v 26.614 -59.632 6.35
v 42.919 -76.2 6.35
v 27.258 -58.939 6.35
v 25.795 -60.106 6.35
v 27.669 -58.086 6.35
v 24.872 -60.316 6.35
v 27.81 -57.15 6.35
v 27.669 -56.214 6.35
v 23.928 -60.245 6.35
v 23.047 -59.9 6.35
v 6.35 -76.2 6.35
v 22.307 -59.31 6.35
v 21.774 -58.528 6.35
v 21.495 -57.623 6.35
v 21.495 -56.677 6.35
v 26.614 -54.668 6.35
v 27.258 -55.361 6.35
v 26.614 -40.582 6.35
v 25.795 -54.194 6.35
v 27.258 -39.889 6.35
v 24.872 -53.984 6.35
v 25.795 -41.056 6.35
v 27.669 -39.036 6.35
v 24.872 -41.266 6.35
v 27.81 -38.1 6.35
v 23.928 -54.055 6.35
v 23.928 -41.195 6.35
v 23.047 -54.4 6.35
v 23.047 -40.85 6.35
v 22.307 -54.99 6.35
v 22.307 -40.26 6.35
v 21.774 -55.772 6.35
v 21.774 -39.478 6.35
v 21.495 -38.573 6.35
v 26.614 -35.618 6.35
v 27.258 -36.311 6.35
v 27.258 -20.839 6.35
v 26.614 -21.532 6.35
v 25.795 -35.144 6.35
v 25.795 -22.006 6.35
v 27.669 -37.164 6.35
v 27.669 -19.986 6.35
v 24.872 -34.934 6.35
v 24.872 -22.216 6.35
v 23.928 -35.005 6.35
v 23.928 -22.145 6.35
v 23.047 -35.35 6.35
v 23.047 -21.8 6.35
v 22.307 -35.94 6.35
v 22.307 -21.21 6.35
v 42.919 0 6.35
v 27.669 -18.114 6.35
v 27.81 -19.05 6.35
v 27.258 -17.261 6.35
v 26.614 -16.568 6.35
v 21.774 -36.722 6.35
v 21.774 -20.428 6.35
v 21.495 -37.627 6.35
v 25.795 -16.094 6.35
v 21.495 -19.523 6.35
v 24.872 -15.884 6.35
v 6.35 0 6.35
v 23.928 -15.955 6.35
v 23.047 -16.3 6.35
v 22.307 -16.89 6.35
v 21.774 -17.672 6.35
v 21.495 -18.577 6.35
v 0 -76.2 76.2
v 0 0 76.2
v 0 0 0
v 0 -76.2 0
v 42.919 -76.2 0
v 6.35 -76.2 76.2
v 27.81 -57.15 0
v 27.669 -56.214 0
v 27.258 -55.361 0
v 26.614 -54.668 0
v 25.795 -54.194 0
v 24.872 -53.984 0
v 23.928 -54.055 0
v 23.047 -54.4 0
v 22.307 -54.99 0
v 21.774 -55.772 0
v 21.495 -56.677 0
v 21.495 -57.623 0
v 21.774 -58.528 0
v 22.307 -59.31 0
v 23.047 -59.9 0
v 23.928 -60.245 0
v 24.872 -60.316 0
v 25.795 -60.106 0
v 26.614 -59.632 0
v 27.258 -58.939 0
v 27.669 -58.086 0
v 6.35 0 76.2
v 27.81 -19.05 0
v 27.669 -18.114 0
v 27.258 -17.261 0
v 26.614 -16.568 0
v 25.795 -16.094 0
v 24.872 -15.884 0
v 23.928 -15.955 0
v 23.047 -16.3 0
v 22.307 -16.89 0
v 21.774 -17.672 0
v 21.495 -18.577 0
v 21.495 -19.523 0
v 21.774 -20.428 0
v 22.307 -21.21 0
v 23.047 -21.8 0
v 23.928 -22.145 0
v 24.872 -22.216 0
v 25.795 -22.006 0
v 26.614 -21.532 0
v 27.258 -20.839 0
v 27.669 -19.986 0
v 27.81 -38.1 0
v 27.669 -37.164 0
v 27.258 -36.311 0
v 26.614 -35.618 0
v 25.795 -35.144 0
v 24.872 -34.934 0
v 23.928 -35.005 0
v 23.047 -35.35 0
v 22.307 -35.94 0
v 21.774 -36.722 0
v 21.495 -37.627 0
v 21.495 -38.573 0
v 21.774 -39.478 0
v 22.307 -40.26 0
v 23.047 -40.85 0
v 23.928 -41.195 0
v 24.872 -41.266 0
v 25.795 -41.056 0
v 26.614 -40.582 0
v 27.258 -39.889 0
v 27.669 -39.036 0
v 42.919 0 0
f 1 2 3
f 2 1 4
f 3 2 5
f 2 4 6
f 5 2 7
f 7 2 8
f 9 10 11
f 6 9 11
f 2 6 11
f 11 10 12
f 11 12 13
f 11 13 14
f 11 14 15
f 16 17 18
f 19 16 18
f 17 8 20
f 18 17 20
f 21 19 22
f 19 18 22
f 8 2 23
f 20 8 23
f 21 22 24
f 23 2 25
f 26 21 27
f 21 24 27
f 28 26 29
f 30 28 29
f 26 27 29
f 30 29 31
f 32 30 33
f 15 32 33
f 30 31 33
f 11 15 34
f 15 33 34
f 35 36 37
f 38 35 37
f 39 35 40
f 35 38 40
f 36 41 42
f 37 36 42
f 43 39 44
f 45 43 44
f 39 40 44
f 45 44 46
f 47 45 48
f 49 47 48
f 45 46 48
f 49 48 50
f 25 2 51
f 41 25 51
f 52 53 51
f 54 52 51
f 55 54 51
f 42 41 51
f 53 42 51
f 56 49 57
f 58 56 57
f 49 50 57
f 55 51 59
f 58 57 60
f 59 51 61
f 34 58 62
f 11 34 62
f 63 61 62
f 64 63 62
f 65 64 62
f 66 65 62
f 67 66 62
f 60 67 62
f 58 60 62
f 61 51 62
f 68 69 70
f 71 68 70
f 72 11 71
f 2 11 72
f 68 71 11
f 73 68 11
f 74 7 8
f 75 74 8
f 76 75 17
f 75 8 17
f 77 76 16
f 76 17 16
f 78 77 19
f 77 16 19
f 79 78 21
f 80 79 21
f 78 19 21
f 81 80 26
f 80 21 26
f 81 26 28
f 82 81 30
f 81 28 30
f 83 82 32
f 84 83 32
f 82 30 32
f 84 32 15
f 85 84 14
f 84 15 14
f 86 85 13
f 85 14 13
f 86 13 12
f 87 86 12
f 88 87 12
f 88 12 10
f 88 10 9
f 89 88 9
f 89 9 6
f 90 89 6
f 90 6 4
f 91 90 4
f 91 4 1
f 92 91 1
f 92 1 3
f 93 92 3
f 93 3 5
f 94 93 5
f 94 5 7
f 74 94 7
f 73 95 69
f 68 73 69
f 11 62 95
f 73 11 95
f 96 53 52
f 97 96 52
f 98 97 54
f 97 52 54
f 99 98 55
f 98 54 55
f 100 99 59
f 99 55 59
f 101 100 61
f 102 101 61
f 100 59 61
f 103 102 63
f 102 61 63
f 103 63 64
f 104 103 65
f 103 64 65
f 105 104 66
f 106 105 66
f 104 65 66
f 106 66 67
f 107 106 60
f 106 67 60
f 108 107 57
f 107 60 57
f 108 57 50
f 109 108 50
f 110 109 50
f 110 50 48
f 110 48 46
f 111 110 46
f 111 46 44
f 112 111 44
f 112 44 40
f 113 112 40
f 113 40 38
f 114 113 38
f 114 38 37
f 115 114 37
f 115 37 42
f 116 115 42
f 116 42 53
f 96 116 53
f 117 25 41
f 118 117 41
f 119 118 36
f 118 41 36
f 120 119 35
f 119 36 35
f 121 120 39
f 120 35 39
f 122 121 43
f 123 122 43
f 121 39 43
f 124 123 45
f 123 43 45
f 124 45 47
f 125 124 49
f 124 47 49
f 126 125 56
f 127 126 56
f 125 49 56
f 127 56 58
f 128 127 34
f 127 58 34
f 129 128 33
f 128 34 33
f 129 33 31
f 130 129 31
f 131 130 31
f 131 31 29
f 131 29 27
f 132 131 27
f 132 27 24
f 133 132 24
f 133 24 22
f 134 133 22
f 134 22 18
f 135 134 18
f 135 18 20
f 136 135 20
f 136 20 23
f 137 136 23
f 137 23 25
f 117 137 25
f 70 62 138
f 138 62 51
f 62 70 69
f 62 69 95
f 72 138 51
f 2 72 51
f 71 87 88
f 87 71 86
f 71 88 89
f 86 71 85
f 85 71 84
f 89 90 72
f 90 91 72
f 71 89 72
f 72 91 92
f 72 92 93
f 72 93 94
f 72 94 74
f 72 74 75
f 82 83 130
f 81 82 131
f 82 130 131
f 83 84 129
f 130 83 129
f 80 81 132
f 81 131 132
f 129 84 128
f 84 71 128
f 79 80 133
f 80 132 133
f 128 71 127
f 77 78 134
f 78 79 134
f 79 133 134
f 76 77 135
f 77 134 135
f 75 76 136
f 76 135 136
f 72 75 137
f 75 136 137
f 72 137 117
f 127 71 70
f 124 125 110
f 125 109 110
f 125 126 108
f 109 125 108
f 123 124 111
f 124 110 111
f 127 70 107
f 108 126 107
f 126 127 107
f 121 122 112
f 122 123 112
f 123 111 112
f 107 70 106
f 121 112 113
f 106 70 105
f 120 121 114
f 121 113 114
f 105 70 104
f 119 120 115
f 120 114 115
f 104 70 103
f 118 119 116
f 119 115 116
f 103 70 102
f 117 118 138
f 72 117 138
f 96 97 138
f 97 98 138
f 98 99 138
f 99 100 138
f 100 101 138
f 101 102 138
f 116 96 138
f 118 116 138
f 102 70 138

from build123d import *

# Parameters (mm, degrees)
F1_DEPTH = 76.2
F2_R     = 3.175
F3_DEPTH = 6.351


with BuildPart() as f1:
    # F0 (on Front) → F1 (new body)
    with BuildSketch(Plane.XZ):
        Polygon((0, 76.2), (0, 0), (42.919317, 0), (42.919317, 6.35), (6.35, 6.35), (6.35, 76.2), align=None)
    extrude(amount=F1_DEPTH)

    # F2 (on face) → F3 (cut, through all)
    with BuildSketch(Plane.XY.offset(6.35)):
        with Locations((24.634659, -19.05)):
            Circle(F2_R)
        with Locations((24.634659, -38.1)):
            Circle(F2_R)
        with Locations((24.634659, -57.15)):
            Circle(F2_R)
    extrude(amount=-F3_DEPTH, mode=Mode.SUBTRACT)


solid = f1.part
